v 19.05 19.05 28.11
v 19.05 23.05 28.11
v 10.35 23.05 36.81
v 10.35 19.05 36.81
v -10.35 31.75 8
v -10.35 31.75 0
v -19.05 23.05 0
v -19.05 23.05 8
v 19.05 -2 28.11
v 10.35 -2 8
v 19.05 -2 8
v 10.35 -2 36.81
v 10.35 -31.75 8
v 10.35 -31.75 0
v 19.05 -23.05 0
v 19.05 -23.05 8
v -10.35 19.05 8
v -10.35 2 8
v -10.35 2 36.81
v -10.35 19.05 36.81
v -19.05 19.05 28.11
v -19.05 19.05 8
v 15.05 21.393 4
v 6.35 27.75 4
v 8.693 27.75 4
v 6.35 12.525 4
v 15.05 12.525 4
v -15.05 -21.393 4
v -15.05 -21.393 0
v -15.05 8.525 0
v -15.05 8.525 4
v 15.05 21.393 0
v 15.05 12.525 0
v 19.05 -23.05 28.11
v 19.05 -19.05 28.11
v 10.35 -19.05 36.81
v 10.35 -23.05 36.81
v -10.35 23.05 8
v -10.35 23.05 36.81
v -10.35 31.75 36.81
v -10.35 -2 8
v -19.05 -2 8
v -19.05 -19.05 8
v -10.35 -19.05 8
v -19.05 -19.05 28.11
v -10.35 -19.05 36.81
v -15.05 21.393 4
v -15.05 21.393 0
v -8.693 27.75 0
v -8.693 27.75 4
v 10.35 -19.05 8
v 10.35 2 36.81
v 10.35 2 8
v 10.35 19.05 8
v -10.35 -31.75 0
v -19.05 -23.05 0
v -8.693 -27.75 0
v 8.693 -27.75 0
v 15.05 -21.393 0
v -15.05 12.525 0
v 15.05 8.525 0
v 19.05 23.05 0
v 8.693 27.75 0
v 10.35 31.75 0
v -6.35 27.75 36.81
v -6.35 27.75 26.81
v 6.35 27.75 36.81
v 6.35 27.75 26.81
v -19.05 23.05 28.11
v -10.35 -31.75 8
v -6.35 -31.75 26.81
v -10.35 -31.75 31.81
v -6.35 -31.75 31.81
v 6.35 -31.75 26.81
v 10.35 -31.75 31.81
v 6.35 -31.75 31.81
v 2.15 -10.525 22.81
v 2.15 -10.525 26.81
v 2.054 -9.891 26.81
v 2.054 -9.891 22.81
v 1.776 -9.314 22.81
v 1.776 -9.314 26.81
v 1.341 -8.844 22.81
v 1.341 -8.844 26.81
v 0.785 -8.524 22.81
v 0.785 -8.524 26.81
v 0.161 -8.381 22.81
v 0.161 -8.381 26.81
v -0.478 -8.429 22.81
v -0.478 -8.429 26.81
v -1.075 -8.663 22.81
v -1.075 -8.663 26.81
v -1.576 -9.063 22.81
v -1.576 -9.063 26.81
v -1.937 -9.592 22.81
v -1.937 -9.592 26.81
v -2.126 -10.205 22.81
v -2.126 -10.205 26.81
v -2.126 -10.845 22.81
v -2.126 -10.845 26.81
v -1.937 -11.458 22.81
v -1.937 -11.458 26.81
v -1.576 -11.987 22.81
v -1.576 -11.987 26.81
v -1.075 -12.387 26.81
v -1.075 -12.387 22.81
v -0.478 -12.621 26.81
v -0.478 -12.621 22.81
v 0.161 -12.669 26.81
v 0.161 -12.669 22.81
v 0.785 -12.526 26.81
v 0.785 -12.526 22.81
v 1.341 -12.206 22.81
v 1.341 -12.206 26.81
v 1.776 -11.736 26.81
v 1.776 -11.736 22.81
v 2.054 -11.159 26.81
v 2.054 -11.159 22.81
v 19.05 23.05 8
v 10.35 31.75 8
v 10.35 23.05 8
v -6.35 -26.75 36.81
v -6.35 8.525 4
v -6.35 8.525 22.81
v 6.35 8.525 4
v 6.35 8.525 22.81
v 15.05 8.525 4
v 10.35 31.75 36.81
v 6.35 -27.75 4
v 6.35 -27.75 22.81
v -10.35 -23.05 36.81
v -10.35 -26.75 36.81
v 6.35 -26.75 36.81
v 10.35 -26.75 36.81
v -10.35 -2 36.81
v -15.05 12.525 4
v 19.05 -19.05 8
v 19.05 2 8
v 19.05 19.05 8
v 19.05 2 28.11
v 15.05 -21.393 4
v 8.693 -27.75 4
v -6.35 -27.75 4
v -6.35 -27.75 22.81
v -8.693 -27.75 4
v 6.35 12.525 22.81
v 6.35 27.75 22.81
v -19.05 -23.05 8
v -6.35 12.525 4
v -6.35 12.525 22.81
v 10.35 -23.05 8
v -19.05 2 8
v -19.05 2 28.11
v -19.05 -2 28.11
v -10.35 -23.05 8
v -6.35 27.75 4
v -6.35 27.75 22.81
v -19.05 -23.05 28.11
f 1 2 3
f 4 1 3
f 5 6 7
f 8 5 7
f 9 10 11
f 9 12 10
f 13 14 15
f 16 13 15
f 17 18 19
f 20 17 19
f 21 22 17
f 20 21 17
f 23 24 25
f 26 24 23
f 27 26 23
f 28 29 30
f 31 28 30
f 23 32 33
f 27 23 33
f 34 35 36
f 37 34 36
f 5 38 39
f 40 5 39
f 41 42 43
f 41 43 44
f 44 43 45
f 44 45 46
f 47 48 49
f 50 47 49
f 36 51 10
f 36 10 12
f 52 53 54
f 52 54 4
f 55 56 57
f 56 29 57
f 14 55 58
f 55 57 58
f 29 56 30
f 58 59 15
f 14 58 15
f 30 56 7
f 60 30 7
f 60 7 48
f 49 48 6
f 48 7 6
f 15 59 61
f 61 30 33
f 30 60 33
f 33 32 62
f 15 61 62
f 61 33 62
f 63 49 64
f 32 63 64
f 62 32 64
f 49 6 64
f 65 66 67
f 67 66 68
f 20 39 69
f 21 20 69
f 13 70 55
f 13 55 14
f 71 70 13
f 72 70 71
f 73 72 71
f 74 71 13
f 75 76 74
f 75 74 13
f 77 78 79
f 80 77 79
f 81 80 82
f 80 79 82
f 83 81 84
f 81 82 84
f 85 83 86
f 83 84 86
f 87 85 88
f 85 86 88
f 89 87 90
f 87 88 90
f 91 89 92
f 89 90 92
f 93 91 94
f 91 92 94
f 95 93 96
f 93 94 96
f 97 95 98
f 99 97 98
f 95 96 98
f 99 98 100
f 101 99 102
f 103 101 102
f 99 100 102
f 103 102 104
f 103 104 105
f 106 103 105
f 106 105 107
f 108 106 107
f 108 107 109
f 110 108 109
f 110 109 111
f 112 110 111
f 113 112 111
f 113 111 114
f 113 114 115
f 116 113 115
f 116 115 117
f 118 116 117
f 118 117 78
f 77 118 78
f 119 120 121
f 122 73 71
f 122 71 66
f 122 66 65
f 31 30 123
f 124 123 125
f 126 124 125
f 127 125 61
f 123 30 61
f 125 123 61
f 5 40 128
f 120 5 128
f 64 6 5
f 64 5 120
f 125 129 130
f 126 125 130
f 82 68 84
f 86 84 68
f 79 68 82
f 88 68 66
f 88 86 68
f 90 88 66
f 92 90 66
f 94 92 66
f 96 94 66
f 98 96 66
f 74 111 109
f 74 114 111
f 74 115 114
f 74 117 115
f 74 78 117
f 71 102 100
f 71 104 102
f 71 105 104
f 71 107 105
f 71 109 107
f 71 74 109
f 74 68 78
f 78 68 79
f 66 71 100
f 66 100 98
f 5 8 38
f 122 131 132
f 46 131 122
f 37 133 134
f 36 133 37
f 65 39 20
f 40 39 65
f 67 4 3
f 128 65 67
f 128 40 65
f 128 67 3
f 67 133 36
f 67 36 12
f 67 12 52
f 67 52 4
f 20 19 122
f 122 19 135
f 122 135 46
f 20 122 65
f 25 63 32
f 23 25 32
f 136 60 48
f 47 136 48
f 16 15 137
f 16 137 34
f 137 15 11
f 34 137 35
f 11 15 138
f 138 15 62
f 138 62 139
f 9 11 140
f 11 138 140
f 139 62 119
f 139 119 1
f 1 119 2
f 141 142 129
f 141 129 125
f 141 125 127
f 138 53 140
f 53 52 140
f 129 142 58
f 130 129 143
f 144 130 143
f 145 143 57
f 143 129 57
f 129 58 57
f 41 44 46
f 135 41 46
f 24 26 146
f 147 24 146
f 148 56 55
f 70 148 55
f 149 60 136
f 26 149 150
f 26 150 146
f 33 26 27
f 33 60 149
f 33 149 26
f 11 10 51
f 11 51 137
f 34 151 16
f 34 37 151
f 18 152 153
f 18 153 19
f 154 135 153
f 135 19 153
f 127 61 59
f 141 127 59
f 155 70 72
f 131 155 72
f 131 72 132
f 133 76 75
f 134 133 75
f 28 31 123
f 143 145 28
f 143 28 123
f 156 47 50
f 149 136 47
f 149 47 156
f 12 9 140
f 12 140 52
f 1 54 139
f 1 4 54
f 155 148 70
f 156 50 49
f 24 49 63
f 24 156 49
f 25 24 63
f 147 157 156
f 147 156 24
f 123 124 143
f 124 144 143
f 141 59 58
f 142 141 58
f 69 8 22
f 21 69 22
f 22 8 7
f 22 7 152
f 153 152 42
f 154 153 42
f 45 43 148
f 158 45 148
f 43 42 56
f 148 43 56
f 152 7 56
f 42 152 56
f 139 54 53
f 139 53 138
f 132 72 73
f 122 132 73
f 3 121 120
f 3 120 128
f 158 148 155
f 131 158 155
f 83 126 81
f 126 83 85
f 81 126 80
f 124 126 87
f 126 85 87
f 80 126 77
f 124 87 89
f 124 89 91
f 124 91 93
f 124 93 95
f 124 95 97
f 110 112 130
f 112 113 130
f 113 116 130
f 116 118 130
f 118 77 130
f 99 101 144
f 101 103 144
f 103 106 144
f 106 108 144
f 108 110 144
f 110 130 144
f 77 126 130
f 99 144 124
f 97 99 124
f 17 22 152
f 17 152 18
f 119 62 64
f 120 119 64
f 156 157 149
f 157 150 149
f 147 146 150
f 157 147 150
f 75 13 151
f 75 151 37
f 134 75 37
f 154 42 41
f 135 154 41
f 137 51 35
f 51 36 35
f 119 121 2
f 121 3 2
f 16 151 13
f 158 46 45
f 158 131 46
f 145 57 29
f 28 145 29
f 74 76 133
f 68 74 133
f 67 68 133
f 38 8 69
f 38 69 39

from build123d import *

# Parameters (mm, degrees)
F1_DEPTH  = 31.75
F2_T      = -4
F3_W      = 4
F3_H      = 10
F4_DEPTH  = 63.5
F6_DEPTH  = 8
F8_DEPTH  = 2
F11_DEPTH = 4
F13_DEPTH = 4
F14_W     = 12.7
F14_H     = 4
F15_DEPTH = 10
F16_SIZE  = 5
F17_R     = 2.15
F18_DEPTH = 25
F19_W     = 30.1
F19_H     = 4


# Not quite as in the source:
# - a pattern or mirror of a feature is missing from the dataset's text; its kind, count and spacing are read off the source's solid


with BuildPart() as f1:
    # F0 (on Front) → F1 (new body, symmetric)
    with BuildSketch(Plane.XZ):
        Polygon((-10.35, 0), (10.35, 0), (10.35, 26.81), (6.35, 26.81), (-6.35, 26.81), (-10.35, 26.81), align=None)
    extrude(amount=F1_DEPTH, both=True)

    # F2
    f2_openings = [f1.faces().sort_by_distance(p)[0] for p in [
        (0, 0, 0),
    ]]
    offset(amount=F2_T, openings=f2_openings)

    # F3 (on face) → F4 (join, through all)
    with BuildSketch(Plane.XZ.offset(31.75)):
        with Locations((-8.35, 31.81)):
            Rectangle(F3_W, F3_H)
        with Locations((8.35, 31.81)):
            Rectangle(F3_W, F3_H)
    extrude(amount=-F4_DEPTH)

    # F5 (on Top) → F6 (join)
    with BuildSketch(Plane.XY):
        Polygon((-19.05, -23.05), (-10.35, -31.75), (-10.35, 31.75), (-19.05, 23.05), align=None)
        Polygon((10.35, 31.75), (10.35, -31.75), (19.05, -23.05), (19.05, 23.05), align=None)
    extrude(amount=F6_DEPTH)

    # F7 (on Front) → F8 (join, symmetric)
    with BuildSketch(Plane.XZ):
        Polygon((-19.05, 8), (-10.35, 8), (-10.35, 36.81), (-19.05, 28.11), align=None)
        Polygon((10.35, 8), (19.05, 8), (19.05, 28.11), (10.35, 36.81), align=None)
    f8 = extrude(amount=F8_DEPTH, both=True)

    # F8_copies: F8 across plane
    add(f8.mirror(Plane(origin=(0, -10.525, 0), x_dir=(0, 0, -1), z_dir=(0, -1, 0))))

    # F10 (on plane+point) → F11 (join)
    with BuildSketch(Plane.XZ.offset(-23.05)):
        Polygon((10.35, 8), (19.05, 8), (19.05, 28.11), (10.35, 36.81), align=None)
        Polygon((-19.05, 28.11), (-19.05, 8), (-10.35, 8), (-10.35, 36.81), align=None)
    extrude(amount=F11_DEPTH)

    # F12 (on face) → F13 (cut)
    with BuildSketch(Plane(origin=(0, 0, 0), x_dir=(1, 0, 0), z_dir=(0, 0, -1))):
        Polygon((-8.6931457505, -27.75), (8.6931457505, -27.75), (15.05, -21.3931457505), (15.05, 21.3931457505), (8.6931457505, 27.75), (-8.6931457505, 27.75), (-15.05, 21.3931457505), (-15.05, -21.3931457505), align=None)
    extrude(amount=-F13_DEPTH, mode=Mode.SUBTRACT)

    # F14 (on face) → F15 (join, through all)
    with BuildSketch(Plane.XY.offset(26.81)):
        with Locations((0, 29.75)):
            Rectangle(F14_W, F14_H)
    extrude(amount=F15_DEPTH)

    # F16
    f16_edges = [f1.edges().sort_by_distance(p)[0] for p in [
        (8.35, -31.75, 36.81),
        (-8.35, -31.75, 36.81),
    ]]
    chamfer(f16_edges, length=F16_SIZE)

    # F17 (on face) → F18 (cut)
    with BuildSketch(Plane.XY.offset(26.81)):
        with Locations((0, -10.525)):
            Circle(F17_R)
    extrude(amount=-F18_DEPTH, mode=Mode.SUBTRACT)

    # F19 (on face) → F20 (join, up to the next surface of F1)
    with BuildSketch(Plane(origin=(0, 0, 0), x_dir=(1, 0, 0), z_dir=(0, 0, -1))):
        with Locations((0, -10.525)):
            Rectangle(F19_W, F19_H)
    extrude(until=Until.NEXT, dir=(0, 0, 1))


solid = f1.part
